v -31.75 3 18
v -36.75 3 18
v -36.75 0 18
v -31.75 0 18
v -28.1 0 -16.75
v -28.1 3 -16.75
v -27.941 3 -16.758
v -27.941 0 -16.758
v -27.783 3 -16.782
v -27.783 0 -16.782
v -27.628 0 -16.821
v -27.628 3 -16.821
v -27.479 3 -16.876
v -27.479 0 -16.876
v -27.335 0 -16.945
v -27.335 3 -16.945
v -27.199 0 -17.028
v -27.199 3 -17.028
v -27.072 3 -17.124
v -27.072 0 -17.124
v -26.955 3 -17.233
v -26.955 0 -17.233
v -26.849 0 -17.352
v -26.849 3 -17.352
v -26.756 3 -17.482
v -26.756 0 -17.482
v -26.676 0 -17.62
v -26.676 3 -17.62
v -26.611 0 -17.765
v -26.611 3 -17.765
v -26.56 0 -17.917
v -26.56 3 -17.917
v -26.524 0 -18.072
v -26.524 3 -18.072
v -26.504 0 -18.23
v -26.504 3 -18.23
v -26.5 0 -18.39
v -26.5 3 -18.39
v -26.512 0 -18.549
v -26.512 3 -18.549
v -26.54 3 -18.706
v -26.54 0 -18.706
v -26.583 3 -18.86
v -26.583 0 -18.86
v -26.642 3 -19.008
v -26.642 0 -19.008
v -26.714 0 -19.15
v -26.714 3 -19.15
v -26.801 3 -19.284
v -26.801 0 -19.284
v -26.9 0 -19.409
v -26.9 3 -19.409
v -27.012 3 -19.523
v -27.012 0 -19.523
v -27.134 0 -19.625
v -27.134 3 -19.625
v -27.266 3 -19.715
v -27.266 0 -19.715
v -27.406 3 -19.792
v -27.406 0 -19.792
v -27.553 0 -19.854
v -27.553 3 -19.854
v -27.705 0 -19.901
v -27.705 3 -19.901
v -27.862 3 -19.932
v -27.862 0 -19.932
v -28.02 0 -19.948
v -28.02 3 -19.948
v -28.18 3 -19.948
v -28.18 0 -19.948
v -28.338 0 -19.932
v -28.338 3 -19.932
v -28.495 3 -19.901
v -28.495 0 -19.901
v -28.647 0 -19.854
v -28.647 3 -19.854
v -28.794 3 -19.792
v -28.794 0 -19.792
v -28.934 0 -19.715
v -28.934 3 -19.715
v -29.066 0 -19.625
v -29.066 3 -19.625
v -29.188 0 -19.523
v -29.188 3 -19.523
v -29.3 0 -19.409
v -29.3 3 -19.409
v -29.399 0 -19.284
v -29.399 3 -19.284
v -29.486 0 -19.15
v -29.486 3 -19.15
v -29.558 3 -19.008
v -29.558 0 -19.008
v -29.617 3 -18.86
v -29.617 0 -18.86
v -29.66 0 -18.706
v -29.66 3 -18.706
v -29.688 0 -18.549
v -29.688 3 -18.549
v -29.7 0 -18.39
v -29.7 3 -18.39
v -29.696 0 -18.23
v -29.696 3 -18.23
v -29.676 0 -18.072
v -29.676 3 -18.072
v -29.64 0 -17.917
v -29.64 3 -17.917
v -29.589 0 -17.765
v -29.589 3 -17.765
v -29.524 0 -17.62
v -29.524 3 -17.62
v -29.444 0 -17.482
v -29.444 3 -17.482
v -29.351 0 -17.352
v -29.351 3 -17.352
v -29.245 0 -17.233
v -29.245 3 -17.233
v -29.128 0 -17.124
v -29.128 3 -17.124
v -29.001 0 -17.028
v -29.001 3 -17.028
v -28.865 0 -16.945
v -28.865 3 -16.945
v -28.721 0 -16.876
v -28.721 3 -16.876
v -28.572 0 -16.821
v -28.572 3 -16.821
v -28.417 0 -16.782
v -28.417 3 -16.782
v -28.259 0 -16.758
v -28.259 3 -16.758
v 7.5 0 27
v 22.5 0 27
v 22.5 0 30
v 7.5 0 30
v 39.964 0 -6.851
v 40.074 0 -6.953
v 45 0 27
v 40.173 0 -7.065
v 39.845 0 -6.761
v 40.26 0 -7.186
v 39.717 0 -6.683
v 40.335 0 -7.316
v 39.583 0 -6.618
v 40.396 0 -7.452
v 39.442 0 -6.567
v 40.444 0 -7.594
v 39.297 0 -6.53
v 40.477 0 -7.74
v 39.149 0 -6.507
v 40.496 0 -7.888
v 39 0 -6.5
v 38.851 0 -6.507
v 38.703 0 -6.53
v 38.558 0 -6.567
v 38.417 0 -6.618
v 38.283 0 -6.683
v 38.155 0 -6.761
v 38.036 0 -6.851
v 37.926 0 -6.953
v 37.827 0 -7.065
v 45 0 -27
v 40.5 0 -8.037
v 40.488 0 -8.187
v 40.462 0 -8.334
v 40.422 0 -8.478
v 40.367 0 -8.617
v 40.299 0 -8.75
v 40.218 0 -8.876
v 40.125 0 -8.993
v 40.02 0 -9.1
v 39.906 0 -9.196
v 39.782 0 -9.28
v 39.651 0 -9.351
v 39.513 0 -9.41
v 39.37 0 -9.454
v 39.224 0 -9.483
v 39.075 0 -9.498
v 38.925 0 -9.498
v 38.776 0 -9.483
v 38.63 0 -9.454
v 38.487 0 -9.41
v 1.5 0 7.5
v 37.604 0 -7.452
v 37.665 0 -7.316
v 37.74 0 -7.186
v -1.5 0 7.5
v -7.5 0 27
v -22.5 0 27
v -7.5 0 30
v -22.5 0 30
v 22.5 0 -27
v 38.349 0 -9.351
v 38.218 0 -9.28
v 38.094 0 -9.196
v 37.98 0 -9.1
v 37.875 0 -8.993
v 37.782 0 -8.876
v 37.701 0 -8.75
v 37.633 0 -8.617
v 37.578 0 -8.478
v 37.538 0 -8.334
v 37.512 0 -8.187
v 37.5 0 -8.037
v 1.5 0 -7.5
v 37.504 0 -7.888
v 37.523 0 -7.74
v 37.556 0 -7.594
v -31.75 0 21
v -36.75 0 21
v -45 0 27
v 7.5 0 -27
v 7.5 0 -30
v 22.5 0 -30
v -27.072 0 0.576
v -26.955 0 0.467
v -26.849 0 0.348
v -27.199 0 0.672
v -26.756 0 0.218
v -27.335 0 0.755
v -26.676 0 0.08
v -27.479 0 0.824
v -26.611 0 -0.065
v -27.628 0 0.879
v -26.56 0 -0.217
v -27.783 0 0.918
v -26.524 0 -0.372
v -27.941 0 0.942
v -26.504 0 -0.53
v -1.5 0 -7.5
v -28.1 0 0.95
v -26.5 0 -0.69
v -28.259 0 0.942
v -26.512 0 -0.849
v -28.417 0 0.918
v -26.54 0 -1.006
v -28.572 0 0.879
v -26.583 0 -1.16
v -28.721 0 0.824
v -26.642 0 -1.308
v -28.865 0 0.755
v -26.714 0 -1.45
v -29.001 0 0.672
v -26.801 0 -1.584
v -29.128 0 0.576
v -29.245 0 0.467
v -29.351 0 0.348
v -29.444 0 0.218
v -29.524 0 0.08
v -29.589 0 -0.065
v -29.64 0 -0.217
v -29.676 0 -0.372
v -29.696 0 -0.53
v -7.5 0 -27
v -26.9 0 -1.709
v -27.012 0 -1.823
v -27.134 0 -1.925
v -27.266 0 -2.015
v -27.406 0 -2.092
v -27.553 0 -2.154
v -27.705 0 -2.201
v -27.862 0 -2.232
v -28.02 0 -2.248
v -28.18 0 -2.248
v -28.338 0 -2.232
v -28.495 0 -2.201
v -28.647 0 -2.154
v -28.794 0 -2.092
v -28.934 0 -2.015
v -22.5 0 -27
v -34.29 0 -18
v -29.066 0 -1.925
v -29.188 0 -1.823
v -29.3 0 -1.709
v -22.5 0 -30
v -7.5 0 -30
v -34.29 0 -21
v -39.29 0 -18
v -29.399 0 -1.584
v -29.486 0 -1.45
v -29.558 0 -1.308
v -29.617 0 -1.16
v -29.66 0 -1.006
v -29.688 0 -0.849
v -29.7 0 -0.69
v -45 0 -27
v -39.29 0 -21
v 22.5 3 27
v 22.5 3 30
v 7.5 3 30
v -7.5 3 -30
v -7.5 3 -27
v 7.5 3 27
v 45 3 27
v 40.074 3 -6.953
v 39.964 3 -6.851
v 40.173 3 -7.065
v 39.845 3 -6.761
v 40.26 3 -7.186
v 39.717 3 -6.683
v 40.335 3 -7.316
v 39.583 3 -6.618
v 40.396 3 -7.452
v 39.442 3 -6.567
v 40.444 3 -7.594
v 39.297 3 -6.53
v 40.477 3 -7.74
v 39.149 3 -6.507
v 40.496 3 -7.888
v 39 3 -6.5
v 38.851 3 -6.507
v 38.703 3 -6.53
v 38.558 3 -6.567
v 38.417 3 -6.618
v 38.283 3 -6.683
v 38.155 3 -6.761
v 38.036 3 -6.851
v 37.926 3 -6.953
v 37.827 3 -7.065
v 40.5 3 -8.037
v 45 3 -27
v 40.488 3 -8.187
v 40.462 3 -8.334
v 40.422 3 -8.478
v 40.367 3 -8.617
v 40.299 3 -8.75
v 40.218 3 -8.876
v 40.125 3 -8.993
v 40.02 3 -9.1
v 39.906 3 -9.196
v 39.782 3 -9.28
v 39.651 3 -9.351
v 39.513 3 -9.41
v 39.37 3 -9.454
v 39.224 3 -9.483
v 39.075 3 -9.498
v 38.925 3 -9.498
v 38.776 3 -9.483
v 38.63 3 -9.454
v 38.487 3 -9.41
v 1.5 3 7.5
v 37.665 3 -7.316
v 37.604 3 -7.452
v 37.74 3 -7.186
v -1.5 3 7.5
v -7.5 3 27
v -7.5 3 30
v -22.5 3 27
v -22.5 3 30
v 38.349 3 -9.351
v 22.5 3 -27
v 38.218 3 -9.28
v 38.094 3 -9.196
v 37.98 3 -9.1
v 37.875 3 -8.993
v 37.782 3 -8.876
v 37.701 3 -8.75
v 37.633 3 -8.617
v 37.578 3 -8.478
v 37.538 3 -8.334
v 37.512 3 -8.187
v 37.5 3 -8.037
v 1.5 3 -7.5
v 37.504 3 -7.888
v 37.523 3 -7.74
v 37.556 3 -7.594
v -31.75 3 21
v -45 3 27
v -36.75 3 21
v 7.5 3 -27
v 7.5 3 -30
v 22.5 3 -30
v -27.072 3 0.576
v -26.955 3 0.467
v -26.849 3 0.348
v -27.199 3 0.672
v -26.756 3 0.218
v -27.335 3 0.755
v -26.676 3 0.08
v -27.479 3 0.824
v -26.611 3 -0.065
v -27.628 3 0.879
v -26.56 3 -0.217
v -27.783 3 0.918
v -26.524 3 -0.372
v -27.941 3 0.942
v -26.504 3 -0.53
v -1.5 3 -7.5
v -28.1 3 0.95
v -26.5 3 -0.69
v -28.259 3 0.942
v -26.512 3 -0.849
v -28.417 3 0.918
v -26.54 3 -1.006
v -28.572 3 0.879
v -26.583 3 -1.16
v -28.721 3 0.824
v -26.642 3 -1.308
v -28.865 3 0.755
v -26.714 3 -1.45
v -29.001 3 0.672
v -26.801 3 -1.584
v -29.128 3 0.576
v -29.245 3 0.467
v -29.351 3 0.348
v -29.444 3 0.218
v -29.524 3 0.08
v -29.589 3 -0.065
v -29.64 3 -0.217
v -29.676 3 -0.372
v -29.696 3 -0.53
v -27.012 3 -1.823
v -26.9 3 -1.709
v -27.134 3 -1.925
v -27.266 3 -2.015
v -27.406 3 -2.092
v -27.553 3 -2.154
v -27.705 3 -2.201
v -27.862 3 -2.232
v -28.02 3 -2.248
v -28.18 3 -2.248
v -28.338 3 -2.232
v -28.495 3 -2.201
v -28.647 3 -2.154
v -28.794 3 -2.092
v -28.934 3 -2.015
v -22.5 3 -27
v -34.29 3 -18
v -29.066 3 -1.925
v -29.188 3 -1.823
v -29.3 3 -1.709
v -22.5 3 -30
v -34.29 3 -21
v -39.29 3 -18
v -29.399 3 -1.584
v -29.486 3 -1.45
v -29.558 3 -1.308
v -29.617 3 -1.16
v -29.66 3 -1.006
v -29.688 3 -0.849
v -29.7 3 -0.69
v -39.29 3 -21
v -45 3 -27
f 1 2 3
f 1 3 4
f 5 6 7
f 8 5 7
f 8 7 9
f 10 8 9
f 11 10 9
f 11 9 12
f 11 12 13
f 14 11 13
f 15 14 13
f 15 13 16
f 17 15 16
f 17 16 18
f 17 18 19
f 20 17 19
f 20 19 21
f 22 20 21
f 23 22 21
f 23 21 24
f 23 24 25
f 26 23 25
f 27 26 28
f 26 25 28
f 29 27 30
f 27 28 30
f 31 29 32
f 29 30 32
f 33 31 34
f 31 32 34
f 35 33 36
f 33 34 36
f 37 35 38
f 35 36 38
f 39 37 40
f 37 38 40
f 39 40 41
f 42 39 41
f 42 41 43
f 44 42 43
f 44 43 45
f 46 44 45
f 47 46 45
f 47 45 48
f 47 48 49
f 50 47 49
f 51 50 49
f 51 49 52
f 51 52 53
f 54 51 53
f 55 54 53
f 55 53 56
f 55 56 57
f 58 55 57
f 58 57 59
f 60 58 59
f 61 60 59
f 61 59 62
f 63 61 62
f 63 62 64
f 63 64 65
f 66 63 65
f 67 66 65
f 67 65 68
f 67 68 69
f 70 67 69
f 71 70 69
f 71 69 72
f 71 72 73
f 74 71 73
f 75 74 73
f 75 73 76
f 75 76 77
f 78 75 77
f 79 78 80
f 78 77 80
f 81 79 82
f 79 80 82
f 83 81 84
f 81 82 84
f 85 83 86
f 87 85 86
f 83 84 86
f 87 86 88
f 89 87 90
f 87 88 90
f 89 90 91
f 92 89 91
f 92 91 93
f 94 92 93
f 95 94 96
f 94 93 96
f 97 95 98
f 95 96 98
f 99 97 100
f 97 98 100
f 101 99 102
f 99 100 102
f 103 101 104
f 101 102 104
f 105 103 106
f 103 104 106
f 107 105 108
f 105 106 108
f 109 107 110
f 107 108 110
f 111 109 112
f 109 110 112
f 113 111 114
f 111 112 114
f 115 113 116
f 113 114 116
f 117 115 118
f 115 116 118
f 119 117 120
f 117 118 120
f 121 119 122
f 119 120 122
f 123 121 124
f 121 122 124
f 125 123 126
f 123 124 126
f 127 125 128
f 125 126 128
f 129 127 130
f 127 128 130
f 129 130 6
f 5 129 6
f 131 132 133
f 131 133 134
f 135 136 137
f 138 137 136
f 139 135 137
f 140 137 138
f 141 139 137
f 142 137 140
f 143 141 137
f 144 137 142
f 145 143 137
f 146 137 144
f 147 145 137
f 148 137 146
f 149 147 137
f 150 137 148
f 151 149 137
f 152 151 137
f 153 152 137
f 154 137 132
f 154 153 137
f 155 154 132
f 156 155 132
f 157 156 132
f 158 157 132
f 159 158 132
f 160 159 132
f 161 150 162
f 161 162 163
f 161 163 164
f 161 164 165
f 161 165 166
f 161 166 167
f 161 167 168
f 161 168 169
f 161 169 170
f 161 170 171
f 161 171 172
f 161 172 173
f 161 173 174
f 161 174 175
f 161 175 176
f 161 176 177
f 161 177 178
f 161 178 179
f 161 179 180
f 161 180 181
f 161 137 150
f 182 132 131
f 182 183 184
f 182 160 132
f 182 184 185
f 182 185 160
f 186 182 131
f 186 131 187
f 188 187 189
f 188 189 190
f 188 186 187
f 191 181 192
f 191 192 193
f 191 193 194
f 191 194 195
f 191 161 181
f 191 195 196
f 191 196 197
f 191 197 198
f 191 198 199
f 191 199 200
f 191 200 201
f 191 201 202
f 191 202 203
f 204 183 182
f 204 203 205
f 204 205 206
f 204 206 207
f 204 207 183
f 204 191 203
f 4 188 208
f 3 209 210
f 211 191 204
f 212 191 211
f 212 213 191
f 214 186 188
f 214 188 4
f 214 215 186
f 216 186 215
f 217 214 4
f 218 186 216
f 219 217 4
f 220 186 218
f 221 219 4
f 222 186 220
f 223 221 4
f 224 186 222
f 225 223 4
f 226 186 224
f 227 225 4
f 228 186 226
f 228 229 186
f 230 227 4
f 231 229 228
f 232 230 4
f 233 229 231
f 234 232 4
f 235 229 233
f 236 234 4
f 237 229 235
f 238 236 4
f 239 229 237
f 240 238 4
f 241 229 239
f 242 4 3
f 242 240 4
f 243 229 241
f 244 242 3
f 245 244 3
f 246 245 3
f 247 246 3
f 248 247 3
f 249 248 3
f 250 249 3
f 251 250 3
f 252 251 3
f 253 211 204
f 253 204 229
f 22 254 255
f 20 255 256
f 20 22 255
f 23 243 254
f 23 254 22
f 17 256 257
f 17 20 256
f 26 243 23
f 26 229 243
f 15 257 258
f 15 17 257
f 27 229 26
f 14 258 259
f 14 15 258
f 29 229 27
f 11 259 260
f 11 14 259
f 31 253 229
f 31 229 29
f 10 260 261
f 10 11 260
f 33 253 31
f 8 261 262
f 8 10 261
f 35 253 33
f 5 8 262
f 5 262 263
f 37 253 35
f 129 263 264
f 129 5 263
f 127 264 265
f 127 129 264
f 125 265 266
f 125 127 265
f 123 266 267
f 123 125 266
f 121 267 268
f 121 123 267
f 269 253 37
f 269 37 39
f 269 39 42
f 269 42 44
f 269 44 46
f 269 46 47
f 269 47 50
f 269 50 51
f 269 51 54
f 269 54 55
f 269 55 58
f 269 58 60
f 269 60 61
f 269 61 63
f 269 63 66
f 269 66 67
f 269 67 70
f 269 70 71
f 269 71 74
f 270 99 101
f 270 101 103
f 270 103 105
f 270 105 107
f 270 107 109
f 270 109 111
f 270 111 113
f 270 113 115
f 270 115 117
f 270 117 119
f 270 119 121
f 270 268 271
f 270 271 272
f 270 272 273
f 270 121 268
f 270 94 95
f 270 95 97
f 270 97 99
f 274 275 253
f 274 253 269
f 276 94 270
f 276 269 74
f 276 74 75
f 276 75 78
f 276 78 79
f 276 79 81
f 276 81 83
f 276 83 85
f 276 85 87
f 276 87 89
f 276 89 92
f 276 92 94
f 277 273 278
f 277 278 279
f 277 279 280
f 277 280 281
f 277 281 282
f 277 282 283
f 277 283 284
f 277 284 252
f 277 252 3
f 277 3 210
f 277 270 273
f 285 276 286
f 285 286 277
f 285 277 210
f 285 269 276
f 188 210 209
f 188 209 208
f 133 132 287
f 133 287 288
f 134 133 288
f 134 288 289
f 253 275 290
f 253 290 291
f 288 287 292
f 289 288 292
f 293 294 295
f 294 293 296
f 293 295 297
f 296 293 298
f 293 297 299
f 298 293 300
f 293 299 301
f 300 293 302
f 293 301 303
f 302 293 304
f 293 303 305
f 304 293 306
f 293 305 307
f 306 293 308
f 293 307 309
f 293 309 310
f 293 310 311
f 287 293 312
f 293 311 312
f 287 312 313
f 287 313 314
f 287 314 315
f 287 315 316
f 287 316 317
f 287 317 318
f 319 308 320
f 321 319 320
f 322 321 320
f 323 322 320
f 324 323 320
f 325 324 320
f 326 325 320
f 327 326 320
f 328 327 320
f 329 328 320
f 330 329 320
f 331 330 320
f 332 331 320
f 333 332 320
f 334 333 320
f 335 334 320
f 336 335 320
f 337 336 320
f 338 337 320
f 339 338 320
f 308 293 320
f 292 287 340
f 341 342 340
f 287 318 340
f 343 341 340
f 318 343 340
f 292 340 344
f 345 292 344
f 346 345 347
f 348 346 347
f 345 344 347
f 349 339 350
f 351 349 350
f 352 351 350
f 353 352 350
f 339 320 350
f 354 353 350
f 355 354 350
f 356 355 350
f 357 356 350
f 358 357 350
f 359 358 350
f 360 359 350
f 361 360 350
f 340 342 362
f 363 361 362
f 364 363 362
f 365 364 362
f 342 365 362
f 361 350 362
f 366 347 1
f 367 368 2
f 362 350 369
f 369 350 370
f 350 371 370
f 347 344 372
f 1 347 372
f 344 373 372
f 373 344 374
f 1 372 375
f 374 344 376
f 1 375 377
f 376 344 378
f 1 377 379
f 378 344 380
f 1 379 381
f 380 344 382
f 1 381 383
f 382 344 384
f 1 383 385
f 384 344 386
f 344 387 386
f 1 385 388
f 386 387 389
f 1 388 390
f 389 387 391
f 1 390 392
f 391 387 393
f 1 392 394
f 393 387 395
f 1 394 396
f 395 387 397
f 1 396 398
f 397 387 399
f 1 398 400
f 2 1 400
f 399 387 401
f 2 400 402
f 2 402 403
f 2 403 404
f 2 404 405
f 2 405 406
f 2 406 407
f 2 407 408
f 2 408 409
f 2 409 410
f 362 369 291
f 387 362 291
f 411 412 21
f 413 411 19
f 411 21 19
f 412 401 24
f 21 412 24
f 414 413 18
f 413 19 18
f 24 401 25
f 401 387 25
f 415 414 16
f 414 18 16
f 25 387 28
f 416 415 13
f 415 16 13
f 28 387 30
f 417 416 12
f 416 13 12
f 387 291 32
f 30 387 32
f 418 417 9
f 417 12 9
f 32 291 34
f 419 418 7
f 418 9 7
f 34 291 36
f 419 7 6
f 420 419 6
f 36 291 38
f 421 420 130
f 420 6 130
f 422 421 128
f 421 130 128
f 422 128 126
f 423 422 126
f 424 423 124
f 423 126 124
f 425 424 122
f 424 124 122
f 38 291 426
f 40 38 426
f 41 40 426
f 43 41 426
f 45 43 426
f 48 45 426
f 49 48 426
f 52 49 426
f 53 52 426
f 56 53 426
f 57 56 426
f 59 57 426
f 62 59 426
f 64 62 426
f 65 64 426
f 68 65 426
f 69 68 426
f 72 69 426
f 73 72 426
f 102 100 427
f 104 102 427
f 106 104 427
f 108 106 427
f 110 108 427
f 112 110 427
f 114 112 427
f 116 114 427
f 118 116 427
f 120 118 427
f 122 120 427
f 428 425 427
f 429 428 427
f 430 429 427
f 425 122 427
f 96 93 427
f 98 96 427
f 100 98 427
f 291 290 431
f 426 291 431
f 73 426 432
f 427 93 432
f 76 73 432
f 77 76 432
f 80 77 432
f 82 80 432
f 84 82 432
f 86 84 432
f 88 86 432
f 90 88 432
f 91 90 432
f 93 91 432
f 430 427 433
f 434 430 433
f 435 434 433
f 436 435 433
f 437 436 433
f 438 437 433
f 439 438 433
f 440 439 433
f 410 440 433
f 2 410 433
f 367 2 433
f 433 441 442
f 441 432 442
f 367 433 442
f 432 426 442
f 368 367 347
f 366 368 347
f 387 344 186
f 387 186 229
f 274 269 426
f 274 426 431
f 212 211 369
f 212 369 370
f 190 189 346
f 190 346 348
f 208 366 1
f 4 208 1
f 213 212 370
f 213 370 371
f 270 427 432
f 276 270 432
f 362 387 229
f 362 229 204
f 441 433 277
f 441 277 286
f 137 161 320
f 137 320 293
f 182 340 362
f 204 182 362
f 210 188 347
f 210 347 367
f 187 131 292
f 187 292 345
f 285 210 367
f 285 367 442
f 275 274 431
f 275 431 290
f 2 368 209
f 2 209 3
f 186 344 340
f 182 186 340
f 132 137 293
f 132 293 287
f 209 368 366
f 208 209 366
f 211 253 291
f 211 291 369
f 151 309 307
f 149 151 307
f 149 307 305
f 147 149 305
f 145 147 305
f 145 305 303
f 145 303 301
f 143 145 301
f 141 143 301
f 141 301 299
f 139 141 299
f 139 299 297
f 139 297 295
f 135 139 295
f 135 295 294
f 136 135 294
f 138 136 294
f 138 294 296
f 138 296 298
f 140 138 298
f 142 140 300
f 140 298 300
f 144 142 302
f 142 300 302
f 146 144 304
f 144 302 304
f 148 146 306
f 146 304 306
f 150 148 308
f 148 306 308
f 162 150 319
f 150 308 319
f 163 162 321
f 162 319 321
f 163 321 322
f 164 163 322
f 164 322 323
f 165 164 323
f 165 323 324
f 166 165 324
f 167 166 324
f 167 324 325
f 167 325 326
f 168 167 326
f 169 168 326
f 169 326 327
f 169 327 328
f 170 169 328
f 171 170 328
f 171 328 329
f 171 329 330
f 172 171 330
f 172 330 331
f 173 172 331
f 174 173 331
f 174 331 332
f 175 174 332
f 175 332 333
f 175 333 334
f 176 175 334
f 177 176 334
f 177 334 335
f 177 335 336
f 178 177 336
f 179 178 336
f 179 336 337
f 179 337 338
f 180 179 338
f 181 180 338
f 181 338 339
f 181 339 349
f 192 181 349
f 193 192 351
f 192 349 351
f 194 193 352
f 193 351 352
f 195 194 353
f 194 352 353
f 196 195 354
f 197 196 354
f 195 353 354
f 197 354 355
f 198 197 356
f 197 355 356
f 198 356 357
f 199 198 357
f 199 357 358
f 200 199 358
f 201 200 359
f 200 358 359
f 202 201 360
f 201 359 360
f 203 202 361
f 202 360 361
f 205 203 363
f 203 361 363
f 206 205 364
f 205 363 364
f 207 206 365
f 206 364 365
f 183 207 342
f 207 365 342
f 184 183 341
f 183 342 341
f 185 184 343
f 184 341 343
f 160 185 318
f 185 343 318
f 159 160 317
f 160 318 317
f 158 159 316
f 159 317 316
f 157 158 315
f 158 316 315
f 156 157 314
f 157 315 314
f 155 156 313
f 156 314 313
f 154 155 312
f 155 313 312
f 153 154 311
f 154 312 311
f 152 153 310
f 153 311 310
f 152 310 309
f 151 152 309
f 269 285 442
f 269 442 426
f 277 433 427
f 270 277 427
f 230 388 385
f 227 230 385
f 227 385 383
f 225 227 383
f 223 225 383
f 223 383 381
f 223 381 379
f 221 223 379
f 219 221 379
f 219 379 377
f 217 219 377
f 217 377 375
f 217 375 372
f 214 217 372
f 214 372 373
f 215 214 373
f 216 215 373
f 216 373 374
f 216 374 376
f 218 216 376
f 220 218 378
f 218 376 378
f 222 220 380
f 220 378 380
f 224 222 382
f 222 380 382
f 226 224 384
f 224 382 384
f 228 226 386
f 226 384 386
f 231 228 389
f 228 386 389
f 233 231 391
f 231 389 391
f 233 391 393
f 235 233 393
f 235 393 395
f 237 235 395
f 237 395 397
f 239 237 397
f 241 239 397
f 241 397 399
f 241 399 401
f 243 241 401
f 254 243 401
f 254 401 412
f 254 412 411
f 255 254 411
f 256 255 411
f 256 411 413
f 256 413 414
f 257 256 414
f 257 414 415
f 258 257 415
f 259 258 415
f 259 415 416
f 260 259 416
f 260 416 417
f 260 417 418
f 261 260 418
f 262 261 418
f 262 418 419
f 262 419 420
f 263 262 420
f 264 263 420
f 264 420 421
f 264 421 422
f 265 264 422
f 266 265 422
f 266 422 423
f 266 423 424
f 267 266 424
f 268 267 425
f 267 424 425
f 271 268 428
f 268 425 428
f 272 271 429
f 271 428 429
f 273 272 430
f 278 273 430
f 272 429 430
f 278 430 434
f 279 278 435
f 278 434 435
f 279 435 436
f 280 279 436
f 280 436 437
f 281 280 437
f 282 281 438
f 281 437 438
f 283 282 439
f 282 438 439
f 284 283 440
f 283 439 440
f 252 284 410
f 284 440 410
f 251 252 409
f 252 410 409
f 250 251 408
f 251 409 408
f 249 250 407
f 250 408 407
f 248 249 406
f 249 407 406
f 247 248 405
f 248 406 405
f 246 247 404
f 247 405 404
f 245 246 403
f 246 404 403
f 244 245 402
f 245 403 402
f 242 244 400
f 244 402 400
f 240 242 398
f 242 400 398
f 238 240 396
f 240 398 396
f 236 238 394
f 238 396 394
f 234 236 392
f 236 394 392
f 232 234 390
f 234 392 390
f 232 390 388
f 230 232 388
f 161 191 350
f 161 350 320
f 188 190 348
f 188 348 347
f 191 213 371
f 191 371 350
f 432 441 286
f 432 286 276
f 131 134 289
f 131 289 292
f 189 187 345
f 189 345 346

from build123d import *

# Parameters (mm, degrees)
BOSS_EXTRUDE1_DEPTH = 3
SKETCH3_W           = 5
SKETCH3_H           = 3
CUT_EXTRUDE2_DEPTH  = 55.166410256
SKETCH4_W           = 3
SKETCH4_H           = 15
CUT_EXTRUDE3_DEPTH  = 55.166410256
SKETCH5_R           = 1.5
CUT_EXTRUDE4_DEPTH  = 55.166410256
SKETCH6_R           = 1.6
CUT_EXTRUDE5_DEPTH  = 55.166410256


with BuildPart() as part:
    # Sketch1 → Boss-Extrude1 (new body)
    with BuildSketch(Plane(origin=(0, 0, 0), x_dir=(1, 0, 0), z_dir=(0, 1, 0))):
        Polygon((-45, 27), (-22.5, 27), (-22.5, 30), (-7.5, 30), (-7.5, 27), (7.5, 27), (7.5, 30), (22.5, 30), (22.5, 27), (45, 27), (45, -27), (22.5, -27), (22.5, -30), (7.5, -30), (7.5, -27), (-7.5, -27), (-7.5, -30), (-22.5, -30), (-22.5, -27), (-45, -27), align=None)
    extrude(amount=BOSS_EXTRUDE1_DEPTH)

    # Sketch3 → Cut-Extrude2 (cut, through all)
    with BuildSketch(Plane(origin=(0, 3, 0), x_dir=(1, 0, 0), z_dir=(0, 1, 0))):
        with Locations((-34.25, -19.5)):
            Rectangle(SKETCH3_W, SKETCH3_H)
        with Locations((-36.79, 19.5)):
            Rectangle(SKETCH3_W, SKETCH3_H)
    extrude(amount=-CUT_EXTRUDE2_DEPTH, mode=Mode.SUBTRACT)

    # Sketch4 → Cut-Extrude3 (cut, through all)
    with BuildSketch(Plane(origin=(0, 3, 0), x_dir=(1, 0, 0), z_dir=(0, 1, 0))):
        Rectangle(SKETCH4_W, SKETCH4_H)
    extrude(amount=-CUT_EXTRUDE3_DEPTH, mode=Mode.SUBTRACT)

    # Sketch5 → Cut-Extrude4 (cut, through all)
    with BuildSketch(Plane(origin=(0, 3, 0), x_dir=(1, 0, 0), z_dir=(0, 1, 0))):
        with Locations(Location((39, 8, 0), (0, 0, 270))):
            Circle(SKETCH5_R)
    extrude(amount=-CUT_EXTRUDE4_DEPTH, mode=Mode.SUBTRACT)

    # Sketch6 → Cut-Extrude5 (cut, through all)
    with BuildSketch(Plane(origin=(0, 3, 0), x_dir=(1, 0, 0), z_dir=(0, 1, 0))):
        with Locations(Location((-28.1, 18.35, 0), (0, 0, 270))):
            Circle(SKETCH6_R)
        with Locations(Location((-28.1, 0.65, 0), (0, 0, 270))):
            Circle(SKETCH6_R)
    extrude(amount=-CUT_EXTRUDE5_DEPTH, mode=Mode.SUBTRACT)


solid = part.part
